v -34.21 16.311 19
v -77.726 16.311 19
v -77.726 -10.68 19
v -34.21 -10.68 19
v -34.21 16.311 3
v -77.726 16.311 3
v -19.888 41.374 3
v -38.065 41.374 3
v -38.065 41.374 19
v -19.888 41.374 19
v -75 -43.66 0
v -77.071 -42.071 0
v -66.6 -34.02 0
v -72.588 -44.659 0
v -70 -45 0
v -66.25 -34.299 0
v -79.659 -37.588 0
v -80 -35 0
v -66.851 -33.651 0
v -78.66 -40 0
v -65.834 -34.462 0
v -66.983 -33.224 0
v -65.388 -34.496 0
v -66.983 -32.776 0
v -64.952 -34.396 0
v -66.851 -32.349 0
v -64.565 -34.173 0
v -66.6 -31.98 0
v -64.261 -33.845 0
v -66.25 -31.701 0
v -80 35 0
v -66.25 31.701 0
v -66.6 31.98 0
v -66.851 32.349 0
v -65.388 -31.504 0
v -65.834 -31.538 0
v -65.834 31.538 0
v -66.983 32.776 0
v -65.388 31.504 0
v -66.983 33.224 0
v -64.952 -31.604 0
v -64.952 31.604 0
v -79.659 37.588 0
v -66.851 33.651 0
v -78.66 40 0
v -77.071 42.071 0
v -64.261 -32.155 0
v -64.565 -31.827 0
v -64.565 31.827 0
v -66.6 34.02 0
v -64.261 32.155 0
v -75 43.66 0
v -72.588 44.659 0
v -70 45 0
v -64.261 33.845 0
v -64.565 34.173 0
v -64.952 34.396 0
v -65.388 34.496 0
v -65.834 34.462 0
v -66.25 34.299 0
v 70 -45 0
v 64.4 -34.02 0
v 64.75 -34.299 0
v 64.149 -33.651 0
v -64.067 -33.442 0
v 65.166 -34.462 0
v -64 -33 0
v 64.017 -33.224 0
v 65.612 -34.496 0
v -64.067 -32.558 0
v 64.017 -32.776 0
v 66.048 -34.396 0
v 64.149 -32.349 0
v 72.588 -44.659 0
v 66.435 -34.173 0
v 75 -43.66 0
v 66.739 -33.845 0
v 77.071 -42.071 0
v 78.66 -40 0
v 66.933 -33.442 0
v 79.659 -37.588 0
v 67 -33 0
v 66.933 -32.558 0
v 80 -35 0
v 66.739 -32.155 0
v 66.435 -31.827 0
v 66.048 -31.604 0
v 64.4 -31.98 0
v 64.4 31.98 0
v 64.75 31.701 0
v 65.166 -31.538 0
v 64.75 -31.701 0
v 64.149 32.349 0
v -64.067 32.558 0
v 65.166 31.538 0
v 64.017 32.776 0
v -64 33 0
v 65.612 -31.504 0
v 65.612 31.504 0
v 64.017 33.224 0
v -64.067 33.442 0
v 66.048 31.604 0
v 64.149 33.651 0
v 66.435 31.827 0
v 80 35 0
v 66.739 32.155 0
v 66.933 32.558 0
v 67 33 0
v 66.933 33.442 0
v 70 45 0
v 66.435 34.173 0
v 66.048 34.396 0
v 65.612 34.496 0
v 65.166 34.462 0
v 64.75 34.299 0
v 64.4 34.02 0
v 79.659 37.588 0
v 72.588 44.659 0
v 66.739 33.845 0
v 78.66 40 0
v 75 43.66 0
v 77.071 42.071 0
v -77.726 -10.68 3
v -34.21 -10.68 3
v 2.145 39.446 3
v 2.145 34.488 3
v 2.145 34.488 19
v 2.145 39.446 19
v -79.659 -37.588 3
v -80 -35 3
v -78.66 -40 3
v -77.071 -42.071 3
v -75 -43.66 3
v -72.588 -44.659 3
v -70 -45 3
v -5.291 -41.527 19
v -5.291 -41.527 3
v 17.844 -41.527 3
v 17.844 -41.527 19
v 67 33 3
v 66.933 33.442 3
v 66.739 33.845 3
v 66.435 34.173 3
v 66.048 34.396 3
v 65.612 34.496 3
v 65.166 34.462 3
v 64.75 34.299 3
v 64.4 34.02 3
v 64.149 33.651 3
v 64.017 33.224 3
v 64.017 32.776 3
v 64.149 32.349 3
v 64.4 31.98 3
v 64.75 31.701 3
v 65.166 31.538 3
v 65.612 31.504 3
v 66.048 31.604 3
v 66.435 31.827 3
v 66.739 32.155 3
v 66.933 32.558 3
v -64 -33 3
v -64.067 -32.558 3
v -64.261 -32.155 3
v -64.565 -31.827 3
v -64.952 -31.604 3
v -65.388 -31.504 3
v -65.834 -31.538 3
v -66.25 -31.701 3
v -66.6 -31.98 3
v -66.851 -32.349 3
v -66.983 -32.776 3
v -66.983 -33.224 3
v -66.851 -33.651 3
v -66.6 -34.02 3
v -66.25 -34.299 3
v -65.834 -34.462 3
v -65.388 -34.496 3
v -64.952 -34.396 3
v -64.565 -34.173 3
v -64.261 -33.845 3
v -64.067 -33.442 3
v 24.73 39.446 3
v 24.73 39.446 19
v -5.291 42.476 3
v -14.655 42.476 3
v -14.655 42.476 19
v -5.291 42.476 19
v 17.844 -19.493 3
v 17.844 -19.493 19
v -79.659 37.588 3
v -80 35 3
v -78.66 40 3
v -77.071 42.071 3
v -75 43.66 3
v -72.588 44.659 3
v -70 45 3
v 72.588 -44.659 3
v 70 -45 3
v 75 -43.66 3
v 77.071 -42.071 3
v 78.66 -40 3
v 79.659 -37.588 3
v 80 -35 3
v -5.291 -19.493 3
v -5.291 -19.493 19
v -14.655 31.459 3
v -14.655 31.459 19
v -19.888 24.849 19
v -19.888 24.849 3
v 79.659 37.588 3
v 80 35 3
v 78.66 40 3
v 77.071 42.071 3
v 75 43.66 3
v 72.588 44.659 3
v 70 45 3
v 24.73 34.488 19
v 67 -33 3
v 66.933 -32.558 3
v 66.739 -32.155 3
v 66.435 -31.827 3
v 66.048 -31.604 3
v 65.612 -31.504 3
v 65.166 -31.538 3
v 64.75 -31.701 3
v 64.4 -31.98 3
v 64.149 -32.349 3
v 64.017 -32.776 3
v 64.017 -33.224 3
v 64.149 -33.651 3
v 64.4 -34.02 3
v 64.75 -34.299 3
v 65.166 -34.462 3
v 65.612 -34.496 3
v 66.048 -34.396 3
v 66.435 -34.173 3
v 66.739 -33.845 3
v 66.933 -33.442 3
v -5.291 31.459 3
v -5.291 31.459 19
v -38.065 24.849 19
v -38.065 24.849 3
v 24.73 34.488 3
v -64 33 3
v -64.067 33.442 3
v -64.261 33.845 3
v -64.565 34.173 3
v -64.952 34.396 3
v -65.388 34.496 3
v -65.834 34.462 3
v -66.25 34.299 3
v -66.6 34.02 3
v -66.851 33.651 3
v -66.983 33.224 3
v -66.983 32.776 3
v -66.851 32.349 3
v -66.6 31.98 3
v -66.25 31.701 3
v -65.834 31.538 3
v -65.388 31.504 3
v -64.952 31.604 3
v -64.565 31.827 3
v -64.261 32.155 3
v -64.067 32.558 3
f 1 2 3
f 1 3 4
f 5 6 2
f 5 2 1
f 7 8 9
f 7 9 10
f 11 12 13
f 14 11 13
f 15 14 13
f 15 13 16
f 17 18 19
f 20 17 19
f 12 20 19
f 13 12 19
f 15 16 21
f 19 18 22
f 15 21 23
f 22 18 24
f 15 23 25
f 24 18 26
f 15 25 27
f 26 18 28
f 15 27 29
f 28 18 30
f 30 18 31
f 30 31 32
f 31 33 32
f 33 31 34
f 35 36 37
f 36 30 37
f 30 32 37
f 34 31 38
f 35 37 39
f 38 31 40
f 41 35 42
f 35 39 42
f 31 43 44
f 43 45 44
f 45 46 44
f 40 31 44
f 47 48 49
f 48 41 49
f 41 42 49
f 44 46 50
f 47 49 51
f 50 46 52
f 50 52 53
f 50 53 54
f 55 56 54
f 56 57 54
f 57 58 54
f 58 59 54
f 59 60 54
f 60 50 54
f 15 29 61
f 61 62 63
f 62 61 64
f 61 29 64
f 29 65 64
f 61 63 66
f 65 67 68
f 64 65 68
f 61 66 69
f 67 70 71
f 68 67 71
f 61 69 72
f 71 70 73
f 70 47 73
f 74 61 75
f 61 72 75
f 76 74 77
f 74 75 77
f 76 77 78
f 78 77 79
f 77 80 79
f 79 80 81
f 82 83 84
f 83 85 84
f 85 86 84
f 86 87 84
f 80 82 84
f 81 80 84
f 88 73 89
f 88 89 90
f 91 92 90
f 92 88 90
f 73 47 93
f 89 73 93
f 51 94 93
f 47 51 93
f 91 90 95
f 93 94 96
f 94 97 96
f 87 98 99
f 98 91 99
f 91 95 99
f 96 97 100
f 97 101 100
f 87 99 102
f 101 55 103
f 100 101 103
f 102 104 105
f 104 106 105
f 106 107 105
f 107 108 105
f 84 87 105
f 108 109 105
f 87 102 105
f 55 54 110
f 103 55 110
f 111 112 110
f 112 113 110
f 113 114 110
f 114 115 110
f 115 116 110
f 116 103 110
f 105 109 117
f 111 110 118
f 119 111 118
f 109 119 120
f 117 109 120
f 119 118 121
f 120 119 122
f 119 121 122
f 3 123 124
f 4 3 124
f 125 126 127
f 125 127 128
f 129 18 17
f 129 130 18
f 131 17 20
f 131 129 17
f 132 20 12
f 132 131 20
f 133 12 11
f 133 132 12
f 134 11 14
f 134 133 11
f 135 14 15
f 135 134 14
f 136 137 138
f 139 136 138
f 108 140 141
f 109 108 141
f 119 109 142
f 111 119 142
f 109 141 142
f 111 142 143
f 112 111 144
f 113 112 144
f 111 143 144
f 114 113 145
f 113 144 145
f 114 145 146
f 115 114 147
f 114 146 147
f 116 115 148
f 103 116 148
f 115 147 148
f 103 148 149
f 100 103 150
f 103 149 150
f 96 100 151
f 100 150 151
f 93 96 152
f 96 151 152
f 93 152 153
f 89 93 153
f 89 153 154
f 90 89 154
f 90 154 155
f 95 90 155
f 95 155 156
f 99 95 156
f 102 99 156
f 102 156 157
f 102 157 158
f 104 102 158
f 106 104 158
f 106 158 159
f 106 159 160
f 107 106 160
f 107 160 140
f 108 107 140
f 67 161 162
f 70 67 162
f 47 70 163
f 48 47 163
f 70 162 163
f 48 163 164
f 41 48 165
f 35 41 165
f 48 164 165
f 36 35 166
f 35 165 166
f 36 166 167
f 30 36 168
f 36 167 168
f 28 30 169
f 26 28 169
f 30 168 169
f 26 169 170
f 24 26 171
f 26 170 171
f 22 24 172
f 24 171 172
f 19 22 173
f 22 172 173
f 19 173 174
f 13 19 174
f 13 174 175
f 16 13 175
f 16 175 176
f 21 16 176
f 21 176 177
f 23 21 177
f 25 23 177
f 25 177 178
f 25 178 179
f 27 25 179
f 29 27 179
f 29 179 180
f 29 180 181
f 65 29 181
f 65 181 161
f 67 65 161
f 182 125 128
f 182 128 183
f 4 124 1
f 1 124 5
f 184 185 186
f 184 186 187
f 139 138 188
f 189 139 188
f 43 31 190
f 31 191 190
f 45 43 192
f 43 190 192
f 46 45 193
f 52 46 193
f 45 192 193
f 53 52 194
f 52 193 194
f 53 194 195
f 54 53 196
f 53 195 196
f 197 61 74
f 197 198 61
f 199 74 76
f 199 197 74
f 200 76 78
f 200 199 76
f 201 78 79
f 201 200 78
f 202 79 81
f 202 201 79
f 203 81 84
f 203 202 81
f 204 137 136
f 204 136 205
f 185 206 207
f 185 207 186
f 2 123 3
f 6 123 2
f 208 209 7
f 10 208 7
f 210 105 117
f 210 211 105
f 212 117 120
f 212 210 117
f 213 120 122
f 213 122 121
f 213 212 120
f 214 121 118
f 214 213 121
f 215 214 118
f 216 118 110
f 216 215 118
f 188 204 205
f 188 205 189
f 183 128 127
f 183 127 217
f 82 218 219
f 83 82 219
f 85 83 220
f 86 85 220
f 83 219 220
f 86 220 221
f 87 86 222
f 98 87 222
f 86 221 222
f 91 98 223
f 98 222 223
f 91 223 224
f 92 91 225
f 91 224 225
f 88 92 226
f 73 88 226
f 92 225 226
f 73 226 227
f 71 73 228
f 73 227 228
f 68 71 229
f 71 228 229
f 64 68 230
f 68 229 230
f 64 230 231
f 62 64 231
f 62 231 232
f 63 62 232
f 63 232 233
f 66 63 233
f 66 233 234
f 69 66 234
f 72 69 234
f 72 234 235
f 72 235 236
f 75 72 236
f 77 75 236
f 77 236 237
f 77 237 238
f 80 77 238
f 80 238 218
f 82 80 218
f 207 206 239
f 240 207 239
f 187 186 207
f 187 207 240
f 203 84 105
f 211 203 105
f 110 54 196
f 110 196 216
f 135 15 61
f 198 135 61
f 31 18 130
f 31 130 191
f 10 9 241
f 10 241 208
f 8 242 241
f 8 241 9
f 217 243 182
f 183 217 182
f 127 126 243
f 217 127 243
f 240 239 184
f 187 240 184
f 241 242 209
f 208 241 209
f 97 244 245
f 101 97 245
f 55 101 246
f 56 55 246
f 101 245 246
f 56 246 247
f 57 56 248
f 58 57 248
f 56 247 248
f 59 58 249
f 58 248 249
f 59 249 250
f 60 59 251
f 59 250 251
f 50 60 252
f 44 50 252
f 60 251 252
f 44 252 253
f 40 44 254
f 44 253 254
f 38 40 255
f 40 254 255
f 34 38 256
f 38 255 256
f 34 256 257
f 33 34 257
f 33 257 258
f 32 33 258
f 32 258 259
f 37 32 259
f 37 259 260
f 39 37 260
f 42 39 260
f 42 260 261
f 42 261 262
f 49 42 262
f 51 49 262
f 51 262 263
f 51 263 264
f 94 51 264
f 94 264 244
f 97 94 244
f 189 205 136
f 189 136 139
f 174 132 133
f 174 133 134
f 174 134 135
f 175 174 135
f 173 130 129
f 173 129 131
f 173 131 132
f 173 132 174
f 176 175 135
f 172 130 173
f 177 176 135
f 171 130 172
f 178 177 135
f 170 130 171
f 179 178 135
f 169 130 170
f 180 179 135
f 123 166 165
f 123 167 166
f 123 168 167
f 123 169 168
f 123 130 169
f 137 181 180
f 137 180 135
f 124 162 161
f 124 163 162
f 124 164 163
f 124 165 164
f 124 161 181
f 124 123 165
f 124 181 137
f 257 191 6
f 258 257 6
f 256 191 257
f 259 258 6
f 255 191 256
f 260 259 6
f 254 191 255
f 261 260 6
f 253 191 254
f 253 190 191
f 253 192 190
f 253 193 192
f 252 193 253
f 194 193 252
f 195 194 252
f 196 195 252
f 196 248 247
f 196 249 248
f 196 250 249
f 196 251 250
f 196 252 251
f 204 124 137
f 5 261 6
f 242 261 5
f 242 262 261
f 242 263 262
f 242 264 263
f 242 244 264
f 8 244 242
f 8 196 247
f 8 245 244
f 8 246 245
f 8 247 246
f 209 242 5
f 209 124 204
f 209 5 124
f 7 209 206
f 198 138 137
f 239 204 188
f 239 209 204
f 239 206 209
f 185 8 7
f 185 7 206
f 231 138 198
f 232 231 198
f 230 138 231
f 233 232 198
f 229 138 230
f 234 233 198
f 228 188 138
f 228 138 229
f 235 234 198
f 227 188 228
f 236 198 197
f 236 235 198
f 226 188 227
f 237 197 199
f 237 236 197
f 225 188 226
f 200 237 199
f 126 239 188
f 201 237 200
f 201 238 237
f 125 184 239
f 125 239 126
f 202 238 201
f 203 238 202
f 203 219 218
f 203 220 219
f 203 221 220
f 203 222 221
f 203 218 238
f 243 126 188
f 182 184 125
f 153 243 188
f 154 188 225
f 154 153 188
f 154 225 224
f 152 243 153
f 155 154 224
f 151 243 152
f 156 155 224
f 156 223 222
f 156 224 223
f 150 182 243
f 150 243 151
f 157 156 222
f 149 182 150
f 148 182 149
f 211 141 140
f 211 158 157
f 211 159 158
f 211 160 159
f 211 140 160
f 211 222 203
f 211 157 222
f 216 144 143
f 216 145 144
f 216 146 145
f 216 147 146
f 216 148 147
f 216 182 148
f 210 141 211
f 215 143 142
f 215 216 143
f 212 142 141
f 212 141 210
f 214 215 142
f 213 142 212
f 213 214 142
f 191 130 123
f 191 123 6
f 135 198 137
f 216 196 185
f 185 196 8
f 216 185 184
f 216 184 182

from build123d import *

# Parameters (mm, degrees)
SKETCH1_W           = 160
SKETCH1_H           = 90
BOSS_EXTRUDE1_DEPTH = 3
FILLET1_R           = 10
SKETCH2_R           = 1.5
CUT_EXTRUDE1_DEPTH  = 4
SKETCH3_W           = 43.515917568
SKETCH3_H           = 26.99088558
SKETCH3_W_2         = 23.135044783
SKETCH3_H_2         = 22.033375984
SKETCH3_W_3         = 18.177535187
SKETCH3_H_3         = 16.525031987
SKETCH3_W_4         = 9.364184793
SKETCH3_H_4         = 11.016687992
SKETCH3_W_5         = 22.584210384
SKETCH3_H_5         = 4.957509597
BOSS_EXTRUDE2_DEPTH = 16


with BuildPart() as part:
    # Sketch1 → Boss-Extrude1 (new body)
    with BuildSketch(Plane.XY):
        Rectangle(SKETCH1_W, SKETCH1_H)
    extrude(amount=BOSS_EXTRUDE1_DEPTH)

    # Fillet1
    fillet1_edges = [part.edges().sort_by_distance(p)[0] for p in [
        (80, -45, 1.5),
        (-80, -45, 1.5),
        (-80, 45, 1.5),
        (80, 45, 1.5),
    ]]
    fillet(fillet1_edges, radius=FILLET1_R)

    # Sketch2 → Cut-Extrude1 (cut, through all)
    with BuildSketch(Plane.XY.offset(3)):
        with Locations((-65.5, 33)):
            Circle(SKETCH2_R)
        with Locations((65.5, 33)):
            Circle(SKETCH2_R)
        with Locations((65.5, -33)):
            Circle(SKETCH2_R)
        with Locations((-65.5, -33)):
            Circle(SKETCH2_R)
    extrude(amount=-CUT_EXTRUDE1_DEPTH, mode=Mode.SUBTRACT)

    # Sketch3 → Boss-Extrude2 (add)
    with BuildSketch(Plane.XY.offset(3)):
        with Locations((-55.967549569, 2.815480553)):
            Rectangle(SKETCH3_W, SKETCH3_H)
        with Locations((6.276737585, -30.510000623)):
            Rectangle(SKETCH3_W_2, SKETCH3_H_2)
        with Locations((-28.976663989, 33.111372531)):
            Rectangle(SKETCH3_W_3, SKETCH3_H_3)
        with Locations((-9.972877203, 36.967213328)):
            Rectangle(SKETCH3_W_4, SKETCH3_H_4)
        with Locations((13.43758478, 36.967213328)):
            Rectangle(SKETCH3_W_5, SKETCH3_H_5)
    extrude(amount=BOSS_EXTRUDE2_DEPTH)


solid = part.part
